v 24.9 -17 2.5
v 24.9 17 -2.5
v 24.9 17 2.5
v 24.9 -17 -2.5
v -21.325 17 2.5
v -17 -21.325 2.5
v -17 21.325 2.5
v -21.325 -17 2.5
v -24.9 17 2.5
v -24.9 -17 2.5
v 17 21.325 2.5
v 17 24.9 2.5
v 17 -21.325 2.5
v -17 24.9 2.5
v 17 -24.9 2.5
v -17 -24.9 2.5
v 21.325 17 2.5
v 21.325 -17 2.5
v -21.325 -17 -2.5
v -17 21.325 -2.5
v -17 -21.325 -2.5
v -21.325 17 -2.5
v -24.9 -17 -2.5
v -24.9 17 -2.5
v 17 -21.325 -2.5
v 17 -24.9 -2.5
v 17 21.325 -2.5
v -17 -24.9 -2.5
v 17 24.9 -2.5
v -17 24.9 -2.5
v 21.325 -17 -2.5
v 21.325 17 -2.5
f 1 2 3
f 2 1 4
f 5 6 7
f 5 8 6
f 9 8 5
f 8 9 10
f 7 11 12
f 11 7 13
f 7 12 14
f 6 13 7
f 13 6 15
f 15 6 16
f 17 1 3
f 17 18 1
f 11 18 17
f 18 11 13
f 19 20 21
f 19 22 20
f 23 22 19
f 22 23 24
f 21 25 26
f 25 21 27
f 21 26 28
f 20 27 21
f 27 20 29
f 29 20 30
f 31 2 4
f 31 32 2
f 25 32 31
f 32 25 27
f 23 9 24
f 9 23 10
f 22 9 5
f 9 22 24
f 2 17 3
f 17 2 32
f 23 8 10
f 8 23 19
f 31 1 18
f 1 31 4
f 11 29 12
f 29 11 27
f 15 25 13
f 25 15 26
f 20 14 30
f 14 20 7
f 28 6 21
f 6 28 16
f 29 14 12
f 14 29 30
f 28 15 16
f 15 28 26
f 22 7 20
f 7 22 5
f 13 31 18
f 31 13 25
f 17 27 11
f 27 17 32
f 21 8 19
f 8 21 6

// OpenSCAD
//Cube insert: Perpendicular 


/* [Hiden] */
$fn = 80;
eps = .002;
a = 49.8;
b = 33.6;
c = 6.28;
d = 53.8;
h = 5;
IM_offset = 0.2;

insert();

module insert() {
    union() {   //basic insert design
            cube([a,b+2*IM_offset,h], center=true);
            cube([b+2*IM_offset,a,h], center=true);
            rotate(a=[0,0,45]){
                cube([c,d+2*IM_offset,h], center=true);
            }
            rotate(a=[0,0,-45]){
                cube([c,d+2*IM_offset,h], center=true);
            }
        }
}
